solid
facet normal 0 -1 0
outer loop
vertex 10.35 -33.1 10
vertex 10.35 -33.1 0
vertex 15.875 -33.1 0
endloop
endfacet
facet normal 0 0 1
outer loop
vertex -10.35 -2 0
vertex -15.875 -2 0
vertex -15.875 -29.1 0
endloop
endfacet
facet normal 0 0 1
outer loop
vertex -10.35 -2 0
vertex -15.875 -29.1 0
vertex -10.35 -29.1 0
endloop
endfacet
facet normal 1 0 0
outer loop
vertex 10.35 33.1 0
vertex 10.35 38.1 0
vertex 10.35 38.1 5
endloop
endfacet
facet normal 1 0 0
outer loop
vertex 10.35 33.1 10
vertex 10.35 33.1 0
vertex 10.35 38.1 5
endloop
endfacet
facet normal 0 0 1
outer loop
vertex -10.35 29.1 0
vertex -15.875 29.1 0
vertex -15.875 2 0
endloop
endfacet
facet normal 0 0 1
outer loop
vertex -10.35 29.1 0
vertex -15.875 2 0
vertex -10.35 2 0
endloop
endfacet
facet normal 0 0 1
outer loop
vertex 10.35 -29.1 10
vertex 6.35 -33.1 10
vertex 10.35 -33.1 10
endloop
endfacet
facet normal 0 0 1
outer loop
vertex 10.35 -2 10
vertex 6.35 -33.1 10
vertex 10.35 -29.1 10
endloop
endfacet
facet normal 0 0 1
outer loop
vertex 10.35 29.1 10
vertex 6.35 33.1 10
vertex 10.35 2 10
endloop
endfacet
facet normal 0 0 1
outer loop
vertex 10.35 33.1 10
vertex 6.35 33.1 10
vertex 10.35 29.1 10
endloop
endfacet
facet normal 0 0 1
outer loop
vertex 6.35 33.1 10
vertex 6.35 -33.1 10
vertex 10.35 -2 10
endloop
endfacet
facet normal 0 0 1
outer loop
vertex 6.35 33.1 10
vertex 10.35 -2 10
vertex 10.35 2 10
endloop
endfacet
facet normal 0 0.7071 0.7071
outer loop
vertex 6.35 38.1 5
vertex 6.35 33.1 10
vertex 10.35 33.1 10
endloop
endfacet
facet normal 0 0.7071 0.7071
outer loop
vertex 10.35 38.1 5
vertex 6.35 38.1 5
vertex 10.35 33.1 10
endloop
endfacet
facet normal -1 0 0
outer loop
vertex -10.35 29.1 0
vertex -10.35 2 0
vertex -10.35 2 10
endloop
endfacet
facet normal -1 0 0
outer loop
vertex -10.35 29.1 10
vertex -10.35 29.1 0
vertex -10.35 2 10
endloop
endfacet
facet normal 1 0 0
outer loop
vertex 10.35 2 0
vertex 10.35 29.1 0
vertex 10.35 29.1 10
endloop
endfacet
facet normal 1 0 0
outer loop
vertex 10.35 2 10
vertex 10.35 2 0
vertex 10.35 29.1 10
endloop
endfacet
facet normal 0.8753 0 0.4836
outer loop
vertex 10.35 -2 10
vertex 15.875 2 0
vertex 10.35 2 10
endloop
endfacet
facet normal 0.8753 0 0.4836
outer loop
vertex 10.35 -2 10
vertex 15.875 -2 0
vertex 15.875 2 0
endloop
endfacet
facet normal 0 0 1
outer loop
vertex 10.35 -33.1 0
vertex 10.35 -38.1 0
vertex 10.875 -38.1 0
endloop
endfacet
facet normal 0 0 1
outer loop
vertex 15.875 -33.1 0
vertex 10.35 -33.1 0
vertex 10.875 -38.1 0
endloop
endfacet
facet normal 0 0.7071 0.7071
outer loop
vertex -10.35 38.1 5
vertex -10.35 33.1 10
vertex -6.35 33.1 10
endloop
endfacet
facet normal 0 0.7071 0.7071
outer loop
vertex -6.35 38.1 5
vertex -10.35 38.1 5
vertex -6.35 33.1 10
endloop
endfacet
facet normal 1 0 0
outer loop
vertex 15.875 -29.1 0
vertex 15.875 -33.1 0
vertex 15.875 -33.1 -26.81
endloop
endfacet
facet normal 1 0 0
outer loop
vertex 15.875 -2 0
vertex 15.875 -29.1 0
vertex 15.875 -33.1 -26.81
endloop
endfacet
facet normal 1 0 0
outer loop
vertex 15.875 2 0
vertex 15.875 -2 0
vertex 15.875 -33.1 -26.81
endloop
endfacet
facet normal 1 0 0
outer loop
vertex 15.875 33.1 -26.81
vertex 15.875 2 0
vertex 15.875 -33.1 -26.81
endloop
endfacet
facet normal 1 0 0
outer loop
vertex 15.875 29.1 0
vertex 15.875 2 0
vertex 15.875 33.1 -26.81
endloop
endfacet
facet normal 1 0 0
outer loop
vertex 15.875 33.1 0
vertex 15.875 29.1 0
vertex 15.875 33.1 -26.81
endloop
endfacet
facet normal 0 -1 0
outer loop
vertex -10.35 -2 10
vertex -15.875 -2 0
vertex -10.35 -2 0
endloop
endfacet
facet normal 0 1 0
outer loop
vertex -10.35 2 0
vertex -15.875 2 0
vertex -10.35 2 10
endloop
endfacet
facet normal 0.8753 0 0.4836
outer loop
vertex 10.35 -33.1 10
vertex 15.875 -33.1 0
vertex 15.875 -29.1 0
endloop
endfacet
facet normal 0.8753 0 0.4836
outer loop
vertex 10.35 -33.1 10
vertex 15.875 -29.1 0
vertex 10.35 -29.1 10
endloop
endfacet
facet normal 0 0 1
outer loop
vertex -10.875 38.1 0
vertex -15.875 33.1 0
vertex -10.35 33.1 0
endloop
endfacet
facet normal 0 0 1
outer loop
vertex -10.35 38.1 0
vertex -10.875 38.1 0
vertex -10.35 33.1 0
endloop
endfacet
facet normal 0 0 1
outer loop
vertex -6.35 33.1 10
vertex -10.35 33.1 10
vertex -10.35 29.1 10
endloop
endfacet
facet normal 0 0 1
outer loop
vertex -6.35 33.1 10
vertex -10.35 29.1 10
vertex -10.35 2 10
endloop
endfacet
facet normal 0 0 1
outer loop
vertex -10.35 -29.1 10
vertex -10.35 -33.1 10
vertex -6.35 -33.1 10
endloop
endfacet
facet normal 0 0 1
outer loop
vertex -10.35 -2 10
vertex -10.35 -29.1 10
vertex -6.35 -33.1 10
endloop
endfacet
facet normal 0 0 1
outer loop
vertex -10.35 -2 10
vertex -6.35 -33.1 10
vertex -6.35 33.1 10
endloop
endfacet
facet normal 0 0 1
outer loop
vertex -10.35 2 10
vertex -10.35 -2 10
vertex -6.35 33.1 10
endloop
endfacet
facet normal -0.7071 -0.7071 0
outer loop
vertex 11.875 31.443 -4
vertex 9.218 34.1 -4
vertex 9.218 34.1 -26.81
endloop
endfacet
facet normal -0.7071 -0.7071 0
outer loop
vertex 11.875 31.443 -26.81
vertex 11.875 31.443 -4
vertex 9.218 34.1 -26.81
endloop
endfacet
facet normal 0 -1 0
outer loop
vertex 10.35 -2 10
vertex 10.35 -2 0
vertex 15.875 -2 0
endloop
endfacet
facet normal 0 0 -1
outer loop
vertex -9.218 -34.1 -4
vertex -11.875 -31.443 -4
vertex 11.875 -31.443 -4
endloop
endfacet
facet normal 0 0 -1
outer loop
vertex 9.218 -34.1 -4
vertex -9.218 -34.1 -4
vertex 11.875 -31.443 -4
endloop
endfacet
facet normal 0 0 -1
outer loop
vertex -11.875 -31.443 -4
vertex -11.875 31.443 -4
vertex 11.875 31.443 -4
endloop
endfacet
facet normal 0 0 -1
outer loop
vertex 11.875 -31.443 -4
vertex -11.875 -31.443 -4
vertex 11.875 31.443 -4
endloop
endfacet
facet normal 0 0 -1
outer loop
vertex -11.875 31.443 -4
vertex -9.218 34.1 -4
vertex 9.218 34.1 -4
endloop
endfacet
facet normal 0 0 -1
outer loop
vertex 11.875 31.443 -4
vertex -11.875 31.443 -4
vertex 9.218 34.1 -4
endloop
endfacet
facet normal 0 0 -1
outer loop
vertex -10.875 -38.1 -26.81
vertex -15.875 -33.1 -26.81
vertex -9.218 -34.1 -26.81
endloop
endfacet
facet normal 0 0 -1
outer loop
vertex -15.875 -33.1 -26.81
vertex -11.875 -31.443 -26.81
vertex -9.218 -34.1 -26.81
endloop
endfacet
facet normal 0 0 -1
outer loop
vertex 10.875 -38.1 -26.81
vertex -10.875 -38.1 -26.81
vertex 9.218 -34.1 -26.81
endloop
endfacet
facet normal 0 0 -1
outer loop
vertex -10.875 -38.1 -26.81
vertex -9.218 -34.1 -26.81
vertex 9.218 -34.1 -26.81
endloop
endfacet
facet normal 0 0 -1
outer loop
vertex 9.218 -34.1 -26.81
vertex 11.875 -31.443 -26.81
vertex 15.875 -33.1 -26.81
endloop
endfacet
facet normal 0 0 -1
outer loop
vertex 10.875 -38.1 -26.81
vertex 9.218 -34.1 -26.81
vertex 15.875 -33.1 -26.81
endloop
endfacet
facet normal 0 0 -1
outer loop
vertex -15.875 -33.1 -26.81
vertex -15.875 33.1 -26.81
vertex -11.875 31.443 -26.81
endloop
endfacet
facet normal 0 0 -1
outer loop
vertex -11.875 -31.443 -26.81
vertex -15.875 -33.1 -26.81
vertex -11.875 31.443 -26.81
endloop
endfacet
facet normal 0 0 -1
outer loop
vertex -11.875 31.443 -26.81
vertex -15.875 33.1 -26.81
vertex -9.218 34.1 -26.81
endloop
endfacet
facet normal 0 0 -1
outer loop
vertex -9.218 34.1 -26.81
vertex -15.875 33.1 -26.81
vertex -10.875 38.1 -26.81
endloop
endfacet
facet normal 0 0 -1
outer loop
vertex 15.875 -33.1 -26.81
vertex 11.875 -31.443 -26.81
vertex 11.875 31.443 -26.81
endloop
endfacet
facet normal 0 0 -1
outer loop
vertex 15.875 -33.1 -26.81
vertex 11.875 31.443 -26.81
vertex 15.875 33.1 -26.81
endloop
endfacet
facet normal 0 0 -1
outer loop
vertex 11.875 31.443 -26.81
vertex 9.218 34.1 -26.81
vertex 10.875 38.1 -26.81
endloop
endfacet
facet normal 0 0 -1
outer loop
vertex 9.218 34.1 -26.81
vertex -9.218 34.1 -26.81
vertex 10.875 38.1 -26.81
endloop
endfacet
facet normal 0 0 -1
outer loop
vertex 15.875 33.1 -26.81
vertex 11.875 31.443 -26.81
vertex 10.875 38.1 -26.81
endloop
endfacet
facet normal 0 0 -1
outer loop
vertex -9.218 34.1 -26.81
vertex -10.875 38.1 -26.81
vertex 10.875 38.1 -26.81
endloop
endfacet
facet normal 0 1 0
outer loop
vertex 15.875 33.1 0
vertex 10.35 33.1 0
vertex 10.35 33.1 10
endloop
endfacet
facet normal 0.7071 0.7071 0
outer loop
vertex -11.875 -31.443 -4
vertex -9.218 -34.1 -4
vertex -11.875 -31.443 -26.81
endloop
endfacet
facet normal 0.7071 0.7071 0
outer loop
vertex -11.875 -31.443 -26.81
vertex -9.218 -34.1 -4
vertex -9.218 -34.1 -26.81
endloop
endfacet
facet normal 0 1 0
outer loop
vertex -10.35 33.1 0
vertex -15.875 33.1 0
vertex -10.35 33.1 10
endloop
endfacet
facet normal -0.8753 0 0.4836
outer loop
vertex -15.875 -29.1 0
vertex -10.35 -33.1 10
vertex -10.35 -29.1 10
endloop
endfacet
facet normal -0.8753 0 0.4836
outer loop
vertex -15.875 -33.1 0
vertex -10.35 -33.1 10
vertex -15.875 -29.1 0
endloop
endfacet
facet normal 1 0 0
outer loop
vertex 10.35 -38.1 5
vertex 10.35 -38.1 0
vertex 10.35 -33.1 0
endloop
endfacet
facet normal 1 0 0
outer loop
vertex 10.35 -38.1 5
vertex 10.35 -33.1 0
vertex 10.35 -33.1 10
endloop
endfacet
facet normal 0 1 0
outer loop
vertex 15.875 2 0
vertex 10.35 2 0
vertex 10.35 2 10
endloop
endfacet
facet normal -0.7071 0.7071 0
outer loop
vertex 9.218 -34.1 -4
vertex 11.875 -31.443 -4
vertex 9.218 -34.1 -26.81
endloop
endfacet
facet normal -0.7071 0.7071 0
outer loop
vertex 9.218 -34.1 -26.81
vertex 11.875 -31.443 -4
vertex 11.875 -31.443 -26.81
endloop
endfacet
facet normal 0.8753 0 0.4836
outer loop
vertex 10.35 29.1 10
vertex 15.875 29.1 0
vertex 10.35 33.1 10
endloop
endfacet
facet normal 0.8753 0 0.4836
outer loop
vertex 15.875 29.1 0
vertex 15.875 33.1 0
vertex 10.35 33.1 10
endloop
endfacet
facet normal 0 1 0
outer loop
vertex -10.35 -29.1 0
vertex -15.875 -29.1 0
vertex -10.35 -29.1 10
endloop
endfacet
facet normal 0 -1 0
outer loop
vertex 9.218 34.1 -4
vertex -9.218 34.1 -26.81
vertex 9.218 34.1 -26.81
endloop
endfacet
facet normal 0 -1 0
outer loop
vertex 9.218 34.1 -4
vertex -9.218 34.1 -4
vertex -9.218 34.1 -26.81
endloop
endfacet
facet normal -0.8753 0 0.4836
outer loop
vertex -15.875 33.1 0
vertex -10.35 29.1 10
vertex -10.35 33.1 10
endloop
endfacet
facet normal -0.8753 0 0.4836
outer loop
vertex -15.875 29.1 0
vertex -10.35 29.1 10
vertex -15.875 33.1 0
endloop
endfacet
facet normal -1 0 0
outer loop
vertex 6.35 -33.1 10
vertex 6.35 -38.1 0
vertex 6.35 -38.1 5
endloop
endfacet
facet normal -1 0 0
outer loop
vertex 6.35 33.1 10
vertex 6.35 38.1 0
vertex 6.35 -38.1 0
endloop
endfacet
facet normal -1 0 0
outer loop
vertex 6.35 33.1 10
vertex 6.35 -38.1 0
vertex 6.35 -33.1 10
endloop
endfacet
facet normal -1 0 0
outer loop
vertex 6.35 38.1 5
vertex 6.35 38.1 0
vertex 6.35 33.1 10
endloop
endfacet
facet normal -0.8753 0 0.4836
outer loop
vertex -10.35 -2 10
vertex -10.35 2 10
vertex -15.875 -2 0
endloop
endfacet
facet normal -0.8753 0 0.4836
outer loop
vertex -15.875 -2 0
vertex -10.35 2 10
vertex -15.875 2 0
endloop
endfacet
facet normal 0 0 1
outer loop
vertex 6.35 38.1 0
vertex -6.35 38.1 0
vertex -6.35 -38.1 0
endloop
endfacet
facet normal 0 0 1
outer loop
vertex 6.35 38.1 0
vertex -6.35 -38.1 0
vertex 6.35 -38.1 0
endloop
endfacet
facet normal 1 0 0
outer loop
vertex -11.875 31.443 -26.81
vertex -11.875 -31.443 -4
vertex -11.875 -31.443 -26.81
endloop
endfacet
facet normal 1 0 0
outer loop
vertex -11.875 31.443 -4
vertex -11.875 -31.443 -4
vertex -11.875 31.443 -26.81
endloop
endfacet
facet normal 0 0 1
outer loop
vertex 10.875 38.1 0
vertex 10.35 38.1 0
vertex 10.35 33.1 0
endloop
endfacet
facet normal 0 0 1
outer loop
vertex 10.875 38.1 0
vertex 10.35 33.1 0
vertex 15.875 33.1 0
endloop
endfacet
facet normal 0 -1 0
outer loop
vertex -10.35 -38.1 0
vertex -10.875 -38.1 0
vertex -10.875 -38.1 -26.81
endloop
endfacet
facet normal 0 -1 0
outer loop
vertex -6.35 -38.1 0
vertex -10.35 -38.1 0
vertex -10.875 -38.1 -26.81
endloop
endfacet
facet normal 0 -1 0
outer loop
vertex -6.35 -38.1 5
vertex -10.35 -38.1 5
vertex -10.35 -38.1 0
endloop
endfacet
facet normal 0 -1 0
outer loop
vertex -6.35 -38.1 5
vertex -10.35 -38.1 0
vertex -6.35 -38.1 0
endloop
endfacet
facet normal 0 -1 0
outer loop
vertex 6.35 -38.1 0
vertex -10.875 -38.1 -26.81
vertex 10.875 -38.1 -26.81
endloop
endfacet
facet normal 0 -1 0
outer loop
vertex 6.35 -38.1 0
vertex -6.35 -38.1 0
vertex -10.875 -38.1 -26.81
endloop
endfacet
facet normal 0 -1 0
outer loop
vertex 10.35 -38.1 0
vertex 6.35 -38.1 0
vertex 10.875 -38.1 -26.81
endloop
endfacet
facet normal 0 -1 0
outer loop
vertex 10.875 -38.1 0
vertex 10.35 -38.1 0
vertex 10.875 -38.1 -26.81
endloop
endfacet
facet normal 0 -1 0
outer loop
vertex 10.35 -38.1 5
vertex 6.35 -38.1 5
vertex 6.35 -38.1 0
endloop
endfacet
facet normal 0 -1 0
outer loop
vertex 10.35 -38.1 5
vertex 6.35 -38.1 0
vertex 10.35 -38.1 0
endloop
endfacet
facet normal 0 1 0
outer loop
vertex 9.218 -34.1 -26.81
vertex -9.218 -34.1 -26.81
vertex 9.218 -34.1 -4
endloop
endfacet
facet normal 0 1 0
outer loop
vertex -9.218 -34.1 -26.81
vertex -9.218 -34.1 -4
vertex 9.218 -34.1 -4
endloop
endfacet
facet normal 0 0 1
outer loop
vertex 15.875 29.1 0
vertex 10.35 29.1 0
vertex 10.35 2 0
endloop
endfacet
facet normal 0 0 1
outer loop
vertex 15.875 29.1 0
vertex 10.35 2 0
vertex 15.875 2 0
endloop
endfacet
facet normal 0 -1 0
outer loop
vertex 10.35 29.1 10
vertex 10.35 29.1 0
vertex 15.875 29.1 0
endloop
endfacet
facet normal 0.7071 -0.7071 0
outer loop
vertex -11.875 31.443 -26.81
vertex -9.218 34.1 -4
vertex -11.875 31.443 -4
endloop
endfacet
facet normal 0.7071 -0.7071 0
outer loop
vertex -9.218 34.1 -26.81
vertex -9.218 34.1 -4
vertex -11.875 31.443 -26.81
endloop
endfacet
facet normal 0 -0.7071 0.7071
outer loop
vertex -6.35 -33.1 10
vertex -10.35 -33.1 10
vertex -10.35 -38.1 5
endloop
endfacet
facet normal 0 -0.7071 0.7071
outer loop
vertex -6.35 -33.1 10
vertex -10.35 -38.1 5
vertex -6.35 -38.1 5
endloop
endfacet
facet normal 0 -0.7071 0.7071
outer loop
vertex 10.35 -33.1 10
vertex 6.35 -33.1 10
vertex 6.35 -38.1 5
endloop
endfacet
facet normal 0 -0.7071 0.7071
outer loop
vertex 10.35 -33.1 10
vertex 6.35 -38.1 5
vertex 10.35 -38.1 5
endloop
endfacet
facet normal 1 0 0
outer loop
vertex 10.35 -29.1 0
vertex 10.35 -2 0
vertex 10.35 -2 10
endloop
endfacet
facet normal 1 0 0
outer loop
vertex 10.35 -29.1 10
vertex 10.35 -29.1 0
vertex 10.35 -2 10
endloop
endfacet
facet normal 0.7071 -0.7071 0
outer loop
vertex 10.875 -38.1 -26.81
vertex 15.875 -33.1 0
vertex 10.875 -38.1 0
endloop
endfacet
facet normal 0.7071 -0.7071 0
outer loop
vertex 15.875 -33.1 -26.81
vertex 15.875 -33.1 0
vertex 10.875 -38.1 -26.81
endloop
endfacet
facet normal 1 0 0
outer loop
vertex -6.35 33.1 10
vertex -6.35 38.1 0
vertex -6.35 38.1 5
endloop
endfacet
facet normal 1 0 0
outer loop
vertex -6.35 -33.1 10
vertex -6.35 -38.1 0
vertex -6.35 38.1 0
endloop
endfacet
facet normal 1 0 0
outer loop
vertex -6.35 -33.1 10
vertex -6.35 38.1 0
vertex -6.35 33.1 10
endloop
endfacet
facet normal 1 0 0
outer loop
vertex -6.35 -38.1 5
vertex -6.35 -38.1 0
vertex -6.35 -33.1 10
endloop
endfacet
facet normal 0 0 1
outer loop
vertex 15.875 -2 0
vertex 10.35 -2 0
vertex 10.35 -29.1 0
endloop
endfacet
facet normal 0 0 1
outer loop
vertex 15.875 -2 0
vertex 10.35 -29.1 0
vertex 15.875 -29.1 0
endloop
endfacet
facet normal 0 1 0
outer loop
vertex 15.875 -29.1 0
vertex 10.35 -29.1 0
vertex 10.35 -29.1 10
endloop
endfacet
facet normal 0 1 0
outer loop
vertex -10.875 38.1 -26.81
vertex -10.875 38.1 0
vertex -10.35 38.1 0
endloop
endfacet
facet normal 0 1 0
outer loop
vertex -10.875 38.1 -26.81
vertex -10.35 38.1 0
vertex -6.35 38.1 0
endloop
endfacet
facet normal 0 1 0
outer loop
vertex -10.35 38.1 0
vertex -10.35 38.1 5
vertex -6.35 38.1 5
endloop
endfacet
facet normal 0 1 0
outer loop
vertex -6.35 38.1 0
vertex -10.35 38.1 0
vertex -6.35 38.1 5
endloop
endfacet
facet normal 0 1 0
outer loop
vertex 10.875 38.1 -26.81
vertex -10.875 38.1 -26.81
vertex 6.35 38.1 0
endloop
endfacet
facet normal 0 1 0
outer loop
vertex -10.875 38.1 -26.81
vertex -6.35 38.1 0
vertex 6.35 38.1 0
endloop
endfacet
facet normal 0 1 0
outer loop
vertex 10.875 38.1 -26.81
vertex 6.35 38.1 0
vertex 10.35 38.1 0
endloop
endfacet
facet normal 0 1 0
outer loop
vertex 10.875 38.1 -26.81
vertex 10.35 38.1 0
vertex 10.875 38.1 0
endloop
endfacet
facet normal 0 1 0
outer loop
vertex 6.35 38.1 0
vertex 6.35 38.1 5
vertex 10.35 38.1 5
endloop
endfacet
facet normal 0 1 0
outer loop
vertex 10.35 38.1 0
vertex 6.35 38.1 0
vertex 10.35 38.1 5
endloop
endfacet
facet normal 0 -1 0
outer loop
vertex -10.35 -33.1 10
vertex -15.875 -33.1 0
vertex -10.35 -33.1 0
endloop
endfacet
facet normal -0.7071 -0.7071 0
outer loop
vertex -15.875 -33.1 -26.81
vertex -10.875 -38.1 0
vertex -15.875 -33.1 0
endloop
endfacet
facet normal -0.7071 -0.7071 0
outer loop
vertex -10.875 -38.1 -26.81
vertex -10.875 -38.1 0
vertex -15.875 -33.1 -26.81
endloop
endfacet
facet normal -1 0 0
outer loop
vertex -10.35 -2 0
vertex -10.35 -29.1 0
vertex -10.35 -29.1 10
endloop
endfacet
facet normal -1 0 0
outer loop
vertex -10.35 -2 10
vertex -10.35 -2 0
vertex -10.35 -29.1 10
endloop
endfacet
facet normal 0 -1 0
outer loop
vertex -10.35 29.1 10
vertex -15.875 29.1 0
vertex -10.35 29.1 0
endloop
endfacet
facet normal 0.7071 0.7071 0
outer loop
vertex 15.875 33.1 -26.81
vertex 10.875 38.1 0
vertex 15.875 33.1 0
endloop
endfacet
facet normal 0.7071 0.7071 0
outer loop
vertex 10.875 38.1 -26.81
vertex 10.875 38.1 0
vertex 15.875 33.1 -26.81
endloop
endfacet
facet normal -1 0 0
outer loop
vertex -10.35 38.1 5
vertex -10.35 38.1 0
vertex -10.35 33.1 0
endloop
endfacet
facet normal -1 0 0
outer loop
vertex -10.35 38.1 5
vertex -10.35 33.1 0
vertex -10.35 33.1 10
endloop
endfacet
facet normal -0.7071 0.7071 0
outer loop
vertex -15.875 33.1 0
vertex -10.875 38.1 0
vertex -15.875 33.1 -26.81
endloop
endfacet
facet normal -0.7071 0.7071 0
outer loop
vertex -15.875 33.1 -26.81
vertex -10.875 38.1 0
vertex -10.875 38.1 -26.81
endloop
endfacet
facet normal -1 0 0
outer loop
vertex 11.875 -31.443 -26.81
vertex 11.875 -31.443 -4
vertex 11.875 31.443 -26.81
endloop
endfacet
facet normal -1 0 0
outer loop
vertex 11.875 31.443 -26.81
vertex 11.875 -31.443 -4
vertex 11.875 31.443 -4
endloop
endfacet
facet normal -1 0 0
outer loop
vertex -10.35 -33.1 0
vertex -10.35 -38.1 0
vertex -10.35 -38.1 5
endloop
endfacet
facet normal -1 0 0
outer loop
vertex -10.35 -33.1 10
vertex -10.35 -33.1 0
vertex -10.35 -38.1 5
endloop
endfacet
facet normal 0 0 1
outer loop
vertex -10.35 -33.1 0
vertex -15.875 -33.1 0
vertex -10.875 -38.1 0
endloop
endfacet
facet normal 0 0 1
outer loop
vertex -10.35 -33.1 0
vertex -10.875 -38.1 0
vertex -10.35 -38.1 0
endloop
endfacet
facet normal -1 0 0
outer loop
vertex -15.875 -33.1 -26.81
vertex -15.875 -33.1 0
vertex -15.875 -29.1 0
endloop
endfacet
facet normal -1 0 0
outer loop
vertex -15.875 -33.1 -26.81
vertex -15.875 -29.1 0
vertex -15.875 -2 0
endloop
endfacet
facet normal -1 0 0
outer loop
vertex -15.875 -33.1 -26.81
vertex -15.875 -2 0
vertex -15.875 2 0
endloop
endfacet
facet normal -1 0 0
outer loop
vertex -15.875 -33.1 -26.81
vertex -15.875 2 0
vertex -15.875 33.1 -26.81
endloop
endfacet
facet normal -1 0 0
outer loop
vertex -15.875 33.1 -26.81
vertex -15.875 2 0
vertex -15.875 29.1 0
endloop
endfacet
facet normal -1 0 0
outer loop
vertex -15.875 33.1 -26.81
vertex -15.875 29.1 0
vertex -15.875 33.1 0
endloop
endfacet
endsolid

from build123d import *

# Parameters (mm, degrees)
F0_W      = 31.75
F0_H      = 76.2
F1_DEPTH  = 26.81
F2_SIZE   = 5
F3_T      = -4
F4_W      = 4
F4_H      = 10
F5_DEPTH  = 38.1
F7_DEPTH  = 2
F10_DEPTH = 4
F11_SIZE  = 5


# Not quite as in the source:
# - a pattern or mirror of a feature is missing from the dataset's text; its kind, count and spacing are read off the source's solid


with BuildPart() as f1:
    # F0 (on Top) → F1 (new body)
    with BuildSketch(Plane.XY):
        Rectangle(F0_W, F0_H)
    extrude(amount=-F1_DEPTH)

    # F2
    f2_edges = [f1.edges().sort_by_distance(p)[0] for p in [
        (-15.875, -38.1, -13.405),
        (15.875, -38.1, -13.405),
        (-15.875, 38.1, -13.405),
        (15.875, 38.1, -13.405),
    ]]
    chamfer(f2_edges, length=F2_SIZE)

    # F3
    f3_openings = [f1.faces().sort_by_distance(p)[0] for p in [
        (0, 0, -26.81),
    ]]
    offset(amount=F3_T, openings=f3_openings)

    # F4 (on Front) → F5 (join, symmetric)
    with BuildSketch(Plane.XZ):
        with Locations((8.35, 5)):
            Rectangle(F4_W, F4_H)
        with Locations((-8.35, 5)):
            Rectangle(F4_W, F4_H)
    extrude(amount=F5_DEPTH, both=True)

    # F6 (on Front) → F7 (join, symmetric)
    with BuildSketch(Plane.XZ):
        Polygon((-15.875, 0), (-10.35, 0), (-10.35, 10), align=None)
        Polygon((15.875, 0), (10.35, 10), (10.35, 0), align=None)
    f7 = extrude(amount=F7_DEPTH, both=True)

    # F7_copies: F7 across plane
    add(f7.mirror(Plane.ZX.offset(15.55)))

    # F9 (on face) → F10 (join)
    with BuildSketch(Plane.XZ.offset(33.1)):
        Polygon((-10.35, 0), (-10.35, 10), (-15.875, 0), align=None)
        Polygon((10.35, 10), (10.35, 0), (15.875, 0), align=None)
    extrude(amount=-F10_DEPTH)

    # F11
    f11_edges = [f1.edges().sort_by_distance(p)[0] for p in [
        (-8.35, -38.1, 10),
        (8.35, -38.1, 10),
        (-8.35, 38.1, 10),
        (8.35, 38.1, 10),
    ]]
    chamfer(f11_edges, length=F11_SIZE)


solid = f1.part
